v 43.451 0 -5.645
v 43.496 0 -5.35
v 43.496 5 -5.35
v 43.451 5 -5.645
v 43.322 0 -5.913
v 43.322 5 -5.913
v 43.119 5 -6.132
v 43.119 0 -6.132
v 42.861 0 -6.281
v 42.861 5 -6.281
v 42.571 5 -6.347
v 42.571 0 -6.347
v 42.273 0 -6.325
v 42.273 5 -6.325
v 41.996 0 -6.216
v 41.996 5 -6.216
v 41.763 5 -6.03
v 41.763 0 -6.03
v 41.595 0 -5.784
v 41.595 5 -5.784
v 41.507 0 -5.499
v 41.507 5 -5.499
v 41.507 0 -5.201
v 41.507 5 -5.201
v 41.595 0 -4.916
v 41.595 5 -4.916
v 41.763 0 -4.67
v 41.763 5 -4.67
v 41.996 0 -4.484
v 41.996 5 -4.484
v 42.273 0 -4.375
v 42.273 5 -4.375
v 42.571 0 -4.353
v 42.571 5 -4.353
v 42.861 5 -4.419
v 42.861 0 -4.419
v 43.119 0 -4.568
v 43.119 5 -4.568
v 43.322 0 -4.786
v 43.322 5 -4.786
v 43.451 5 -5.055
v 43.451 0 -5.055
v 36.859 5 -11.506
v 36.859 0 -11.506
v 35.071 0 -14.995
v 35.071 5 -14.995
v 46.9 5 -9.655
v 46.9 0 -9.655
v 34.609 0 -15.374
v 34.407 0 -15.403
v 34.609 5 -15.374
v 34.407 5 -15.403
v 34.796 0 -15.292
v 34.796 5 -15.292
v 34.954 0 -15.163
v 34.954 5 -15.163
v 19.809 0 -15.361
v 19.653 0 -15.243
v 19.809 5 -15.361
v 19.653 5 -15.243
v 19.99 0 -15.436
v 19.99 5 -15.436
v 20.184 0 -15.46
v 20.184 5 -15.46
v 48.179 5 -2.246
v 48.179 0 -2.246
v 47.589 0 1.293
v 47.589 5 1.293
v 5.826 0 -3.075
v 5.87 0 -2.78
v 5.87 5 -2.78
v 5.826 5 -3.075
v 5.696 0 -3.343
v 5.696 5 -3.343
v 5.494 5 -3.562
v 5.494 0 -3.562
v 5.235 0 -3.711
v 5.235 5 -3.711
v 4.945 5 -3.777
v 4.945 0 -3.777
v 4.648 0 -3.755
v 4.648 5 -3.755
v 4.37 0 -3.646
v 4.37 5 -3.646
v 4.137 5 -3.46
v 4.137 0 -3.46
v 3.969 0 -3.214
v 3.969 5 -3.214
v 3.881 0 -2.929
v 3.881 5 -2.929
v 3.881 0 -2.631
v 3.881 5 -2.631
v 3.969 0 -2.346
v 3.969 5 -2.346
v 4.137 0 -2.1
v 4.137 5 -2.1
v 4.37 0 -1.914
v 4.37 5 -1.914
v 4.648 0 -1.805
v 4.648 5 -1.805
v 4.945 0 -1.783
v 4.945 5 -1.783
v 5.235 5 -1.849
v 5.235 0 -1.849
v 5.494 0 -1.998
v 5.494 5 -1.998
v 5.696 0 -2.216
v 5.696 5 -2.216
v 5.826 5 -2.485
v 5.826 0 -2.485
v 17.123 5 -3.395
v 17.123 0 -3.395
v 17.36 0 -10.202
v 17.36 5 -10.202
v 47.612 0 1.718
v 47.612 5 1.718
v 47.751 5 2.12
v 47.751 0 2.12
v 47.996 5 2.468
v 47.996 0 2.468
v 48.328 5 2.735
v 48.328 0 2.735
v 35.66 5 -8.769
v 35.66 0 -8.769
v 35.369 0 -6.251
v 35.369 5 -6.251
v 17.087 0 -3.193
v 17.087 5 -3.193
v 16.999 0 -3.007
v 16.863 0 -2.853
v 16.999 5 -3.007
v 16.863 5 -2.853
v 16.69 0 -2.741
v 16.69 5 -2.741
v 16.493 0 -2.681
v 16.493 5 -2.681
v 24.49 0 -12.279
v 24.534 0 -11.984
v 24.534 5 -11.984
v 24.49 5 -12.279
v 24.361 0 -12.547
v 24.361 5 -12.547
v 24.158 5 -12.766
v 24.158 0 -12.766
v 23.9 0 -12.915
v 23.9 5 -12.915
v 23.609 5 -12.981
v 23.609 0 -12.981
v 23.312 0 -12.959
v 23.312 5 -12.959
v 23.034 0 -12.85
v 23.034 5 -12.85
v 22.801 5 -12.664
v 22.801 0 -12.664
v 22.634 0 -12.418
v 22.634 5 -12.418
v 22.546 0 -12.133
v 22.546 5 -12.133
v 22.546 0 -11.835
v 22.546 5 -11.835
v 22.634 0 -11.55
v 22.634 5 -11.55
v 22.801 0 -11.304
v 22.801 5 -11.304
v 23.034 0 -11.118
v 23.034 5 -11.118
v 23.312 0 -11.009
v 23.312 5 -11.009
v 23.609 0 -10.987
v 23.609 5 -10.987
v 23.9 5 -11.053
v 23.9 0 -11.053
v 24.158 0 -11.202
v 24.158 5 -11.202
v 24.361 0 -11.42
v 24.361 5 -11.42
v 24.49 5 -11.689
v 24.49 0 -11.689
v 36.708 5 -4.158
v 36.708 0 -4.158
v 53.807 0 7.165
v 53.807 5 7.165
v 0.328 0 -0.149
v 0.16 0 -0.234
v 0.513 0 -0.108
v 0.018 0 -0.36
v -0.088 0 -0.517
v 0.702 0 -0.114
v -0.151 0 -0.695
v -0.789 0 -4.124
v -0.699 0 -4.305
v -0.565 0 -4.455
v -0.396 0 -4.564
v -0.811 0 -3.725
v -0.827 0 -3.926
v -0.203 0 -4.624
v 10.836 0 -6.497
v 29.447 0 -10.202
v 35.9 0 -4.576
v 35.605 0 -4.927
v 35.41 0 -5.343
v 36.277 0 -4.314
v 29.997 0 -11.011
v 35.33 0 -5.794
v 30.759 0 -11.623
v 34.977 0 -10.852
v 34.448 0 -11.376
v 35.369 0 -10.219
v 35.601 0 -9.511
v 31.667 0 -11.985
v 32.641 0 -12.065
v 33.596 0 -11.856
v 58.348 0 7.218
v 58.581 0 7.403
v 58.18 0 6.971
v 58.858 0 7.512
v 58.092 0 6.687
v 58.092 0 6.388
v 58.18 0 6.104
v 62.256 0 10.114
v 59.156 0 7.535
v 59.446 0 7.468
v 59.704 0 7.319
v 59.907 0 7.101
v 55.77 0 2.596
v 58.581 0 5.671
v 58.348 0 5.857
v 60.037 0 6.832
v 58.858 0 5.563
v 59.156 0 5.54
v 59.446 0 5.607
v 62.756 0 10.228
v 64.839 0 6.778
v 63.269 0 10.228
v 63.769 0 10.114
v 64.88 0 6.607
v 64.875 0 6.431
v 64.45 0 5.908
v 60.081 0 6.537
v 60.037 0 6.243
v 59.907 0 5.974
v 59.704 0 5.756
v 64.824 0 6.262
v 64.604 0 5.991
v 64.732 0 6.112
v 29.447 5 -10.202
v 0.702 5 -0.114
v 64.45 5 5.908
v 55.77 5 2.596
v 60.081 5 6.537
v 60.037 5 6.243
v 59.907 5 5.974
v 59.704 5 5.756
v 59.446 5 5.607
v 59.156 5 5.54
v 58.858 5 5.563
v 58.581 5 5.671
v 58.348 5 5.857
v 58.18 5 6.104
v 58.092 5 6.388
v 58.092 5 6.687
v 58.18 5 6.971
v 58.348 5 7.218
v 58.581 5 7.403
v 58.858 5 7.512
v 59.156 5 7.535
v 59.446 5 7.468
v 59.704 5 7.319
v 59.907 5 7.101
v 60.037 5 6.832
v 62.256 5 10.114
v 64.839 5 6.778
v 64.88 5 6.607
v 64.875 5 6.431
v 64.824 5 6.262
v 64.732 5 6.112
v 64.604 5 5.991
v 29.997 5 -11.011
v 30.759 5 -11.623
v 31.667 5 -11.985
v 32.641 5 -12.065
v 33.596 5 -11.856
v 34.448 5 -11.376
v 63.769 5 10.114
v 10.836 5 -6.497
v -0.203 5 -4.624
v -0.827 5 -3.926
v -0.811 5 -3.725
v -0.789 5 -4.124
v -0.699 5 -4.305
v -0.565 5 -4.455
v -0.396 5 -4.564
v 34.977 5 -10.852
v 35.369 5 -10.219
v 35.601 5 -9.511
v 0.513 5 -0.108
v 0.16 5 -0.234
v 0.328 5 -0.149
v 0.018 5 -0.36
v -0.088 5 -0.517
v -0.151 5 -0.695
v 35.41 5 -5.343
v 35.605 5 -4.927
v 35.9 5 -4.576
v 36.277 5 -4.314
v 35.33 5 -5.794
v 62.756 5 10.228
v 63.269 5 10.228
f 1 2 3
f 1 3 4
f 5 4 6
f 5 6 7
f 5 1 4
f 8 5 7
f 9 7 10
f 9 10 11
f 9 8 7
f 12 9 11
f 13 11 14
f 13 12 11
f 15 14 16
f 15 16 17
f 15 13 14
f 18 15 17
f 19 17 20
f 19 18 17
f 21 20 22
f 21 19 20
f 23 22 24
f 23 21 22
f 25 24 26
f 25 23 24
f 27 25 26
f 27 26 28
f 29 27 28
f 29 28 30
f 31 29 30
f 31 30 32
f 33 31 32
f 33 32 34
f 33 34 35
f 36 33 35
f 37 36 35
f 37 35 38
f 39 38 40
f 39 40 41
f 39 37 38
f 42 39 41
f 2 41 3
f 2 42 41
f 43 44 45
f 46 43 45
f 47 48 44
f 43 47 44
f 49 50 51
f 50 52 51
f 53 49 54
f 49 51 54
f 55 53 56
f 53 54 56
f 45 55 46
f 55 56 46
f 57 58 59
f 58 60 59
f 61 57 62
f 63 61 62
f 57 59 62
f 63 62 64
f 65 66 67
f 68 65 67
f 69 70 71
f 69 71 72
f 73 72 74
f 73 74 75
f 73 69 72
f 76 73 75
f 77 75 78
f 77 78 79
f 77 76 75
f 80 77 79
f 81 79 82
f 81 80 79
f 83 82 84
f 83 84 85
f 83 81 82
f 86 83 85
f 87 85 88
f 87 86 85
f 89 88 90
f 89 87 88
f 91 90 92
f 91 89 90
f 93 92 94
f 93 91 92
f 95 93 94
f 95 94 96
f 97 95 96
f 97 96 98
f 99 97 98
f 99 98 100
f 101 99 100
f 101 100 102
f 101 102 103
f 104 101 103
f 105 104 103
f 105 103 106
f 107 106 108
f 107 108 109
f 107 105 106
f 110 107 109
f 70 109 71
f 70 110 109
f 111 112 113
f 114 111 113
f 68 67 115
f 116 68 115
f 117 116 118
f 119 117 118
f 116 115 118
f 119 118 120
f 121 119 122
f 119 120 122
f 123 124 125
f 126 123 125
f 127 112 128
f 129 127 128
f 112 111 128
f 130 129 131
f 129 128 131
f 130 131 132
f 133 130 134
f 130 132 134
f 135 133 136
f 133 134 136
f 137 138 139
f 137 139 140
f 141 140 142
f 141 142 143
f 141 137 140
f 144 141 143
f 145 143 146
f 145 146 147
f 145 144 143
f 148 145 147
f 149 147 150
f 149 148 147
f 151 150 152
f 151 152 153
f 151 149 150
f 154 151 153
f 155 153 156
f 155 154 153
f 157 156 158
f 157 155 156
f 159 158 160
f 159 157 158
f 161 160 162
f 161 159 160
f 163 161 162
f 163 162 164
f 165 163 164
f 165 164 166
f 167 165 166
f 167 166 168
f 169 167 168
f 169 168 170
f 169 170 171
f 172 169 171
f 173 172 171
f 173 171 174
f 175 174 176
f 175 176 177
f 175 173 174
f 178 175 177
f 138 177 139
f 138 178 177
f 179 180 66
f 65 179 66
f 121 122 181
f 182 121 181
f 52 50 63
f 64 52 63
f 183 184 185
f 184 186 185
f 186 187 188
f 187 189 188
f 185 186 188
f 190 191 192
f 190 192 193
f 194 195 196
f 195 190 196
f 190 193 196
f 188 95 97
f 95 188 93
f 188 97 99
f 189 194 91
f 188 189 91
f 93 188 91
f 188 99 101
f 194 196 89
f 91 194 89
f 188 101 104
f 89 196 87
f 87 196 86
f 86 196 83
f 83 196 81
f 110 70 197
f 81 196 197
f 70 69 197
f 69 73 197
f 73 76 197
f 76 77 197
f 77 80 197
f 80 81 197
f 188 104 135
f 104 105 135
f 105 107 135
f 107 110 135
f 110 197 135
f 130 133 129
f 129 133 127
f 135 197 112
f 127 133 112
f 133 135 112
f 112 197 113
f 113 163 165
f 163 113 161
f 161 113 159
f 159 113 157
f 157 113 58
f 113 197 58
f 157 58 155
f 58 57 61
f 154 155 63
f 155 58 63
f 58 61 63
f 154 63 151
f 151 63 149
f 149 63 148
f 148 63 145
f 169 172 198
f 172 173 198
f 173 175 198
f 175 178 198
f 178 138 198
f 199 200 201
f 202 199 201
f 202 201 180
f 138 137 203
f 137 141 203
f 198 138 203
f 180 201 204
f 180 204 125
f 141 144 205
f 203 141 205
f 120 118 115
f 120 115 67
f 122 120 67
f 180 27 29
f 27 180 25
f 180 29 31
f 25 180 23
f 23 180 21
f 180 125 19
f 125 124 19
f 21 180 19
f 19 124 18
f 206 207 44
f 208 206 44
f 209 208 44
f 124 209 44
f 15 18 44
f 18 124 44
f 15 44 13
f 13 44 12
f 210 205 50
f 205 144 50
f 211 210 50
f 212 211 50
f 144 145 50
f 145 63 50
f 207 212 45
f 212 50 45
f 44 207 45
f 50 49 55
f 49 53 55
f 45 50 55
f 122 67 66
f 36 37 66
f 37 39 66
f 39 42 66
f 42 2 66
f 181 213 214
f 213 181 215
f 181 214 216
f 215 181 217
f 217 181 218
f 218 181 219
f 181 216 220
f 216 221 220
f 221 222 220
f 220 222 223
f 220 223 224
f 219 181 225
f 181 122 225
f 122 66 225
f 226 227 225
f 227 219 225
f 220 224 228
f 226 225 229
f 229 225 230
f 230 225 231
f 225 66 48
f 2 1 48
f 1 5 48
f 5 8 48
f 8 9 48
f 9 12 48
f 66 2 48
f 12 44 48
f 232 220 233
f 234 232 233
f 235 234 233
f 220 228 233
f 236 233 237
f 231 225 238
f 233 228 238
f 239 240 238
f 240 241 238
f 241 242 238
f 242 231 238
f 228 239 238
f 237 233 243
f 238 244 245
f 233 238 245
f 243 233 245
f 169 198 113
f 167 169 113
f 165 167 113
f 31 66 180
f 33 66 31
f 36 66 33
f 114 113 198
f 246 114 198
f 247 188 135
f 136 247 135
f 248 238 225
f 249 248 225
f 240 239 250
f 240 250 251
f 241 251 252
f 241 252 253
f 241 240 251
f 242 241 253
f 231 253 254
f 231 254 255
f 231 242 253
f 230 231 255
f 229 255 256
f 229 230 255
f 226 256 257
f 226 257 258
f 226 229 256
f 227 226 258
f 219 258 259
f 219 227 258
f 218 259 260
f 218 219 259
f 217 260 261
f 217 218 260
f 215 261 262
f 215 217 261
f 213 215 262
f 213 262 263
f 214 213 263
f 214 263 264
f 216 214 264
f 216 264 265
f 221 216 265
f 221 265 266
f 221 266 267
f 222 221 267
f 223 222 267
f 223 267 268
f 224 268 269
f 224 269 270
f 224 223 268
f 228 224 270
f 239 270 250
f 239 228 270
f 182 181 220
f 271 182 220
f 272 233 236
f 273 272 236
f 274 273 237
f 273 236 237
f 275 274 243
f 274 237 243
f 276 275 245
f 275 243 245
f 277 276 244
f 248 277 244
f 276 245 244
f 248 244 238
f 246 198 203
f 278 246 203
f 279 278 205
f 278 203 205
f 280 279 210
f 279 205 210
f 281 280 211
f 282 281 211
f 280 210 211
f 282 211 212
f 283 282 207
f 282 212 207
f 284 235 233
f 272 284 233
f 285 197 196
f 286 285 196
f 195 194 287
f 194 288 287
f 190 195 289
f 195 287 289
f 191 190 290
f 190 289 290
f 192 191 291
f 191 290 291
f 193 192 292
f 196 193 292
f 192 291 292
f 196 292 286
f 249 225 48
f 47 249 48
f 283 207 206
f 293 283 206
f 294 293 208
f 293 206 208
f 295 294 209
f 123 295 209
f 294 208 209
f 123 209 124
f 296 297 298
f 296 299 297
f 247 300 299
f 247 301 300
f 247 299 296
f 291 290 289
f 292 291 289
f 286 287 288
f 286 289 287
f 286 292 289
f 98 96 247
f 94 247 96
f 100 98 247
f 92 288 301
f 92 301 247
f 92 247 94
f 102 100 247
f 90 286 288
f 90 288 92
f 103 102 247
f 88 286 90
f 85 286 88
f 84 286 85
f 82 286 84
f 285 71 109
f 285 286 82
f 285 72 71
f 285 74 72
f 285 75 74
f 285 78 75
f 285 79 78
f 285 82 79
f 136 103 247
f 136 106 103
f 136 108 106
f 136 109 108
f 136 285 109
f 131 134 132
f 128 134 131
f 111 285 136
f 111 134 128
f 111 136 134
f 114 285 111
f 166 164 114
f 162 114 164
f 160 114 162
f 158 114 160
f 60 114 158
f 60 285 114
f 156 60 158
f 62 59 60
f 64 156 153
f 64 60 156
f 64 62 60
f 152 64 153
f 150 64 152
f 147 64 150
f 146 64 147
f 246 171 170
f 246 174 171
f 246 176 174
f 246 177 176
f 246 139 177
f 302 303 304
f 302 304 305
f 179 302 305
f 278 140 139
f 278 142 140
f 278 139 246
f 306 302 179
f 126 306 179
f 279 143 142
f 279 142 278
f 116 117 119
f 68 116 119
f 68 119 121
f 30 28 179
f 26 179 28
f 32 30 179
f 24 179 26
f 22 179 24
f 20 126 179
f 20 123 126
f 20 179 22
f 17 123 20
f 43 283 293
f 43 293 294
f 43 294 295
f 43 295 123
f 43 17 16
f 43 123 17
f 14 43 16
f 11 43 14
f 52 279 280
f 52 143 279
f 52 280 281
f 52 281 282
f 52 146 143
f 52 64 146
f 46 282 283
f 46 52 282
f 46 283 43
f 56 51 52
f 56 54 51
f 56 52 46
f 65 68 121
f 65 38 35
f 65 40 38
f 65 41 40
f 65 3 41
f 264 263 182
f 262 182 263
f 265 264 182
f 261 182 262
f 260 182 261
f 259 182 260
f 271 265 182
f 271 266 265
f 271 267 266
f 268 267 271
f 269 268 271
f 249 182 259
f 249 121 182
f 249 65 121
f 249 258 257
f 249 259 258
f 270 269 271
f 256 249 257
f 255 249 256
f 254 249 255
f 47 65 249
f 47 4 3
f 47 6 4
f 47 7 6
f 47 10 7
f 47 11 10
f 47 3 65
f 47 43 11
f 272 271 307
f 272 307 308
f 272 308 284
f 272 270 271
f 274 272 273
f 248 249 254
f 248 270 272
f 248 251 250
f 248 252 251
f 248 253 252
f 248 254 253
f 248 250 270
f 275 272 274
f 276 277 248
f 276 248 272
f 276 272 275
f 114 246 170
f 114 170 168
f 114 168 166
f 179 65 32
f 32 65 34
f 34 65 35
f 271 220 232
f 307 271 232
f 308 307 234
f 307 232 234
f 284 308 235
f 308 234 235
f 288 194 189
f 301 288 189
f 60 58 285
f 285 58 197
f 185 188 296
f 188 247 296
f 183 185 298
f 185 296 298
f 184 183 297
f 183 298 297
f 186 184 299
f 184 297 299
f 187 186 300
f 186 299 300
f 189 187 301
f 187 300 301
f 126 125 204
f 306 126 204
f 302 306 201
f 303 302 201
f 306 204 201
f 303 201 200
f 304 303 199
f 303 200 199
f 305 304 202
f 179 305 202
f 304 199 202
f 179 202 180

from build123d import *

# Parameters (mm, degrees)
SKETCH1_R           = 1
BOSS_EXTRUDE1_DEPTH = 5
FILLET1_R           = 0.75


with BuildPart() as part:
    # Sketch1 → Boss-Extrude1 (new body)
    with BuildSketch(Plane(origin=(0, 0, 0), x_dir=(1, 0, 0), z_dir=(0, 1, 0))):
        with BuildLine():
            Line((17.35965567, 10.202030332), (29.447075717, 10.202030332))
            ThreePointArc((29.447075717, 10.202030332), (31.66677099, 11.984583247), (34.447841937, 11.376153807))
            ThreePointArc((34.447841937, 11.376153807), (35.368803472, 10.219084334), (35.659625363, 8.769117942))
            Line((35.659625363, 8.769117942), (35.368803472, 6.25123518))
            ThreePointArc((35.368803472, 6.25123518), (35.604797827, 4.927222302), (36.70788952, 4.157877025))
            Line((36.70788952, 4.157877025), (48.178757035, 2.245683648))
            Line((48.178757035, 2.245683648), (47.58886704, -1.292949037))
            ThreePointArc((47.58886704, -1.292949037), (47.751350099, -2.119984122), (48.327597047, -2.73506723))
            Line((48.327597047, -2.73506723), (53.807205044, -7.165448567))
            Line((53.807205044, -7.165448567), (62.256251854, -10.114363821))
            ThreePointArc((62.256251854, -10.114363821), (63.012595107, -10.242357854), (63.768803253, -10.11356799))
            Line((63.768803253, -10.11356799), (64.838933553, -6.777694818))
            ThreePointArc((64.838933553, -6.777694818), (64.82438131, -6.262093226), (64.449505937, -5.907797834))
            Line((64.449505937, -5.907797834), (55.769751742, -2.596216357))
            Line((55.769751742, -2.596216357), (46.89988124, 9.654677352))
            Line((46.89988124, 9.654677352), (36.858577183, 11.505687421))
            Line((36.858577183, 11.505687421), (34.863073504, 15.401227244))
            Line((34.863073504, 15.401227244), (19.873257266, 15.461670051))
            Line((19.873257266, 15.461670051), (10.836196027, 6.49719565))
            Line((10.836196027, 6.49719565), (-0.977680405, 4.492963372))
            Line((-0.977680405, 4.492963372), (0, 0))
            Line((0, 0), (17.101259036, 2.779786934))
            Line((17.101259036, 2.779786934), (17.35965567, 10.202030332))
        make_face()
        with Locations((59.08099239, -6.537460134)):
            Circle(SKETCH1_R, mode=Mode.SUBTRACT)
        with Locations((23.534477486, 11.983797813)):
            Circle(SKETCH1_R, mode=Mode.SUBTRACT)
        with Locations((4.870081777, 2.779786934)):
            Circle(SKETCH1_R, mode=Mode.SUBTRACT)
        with Locations((42.49591928, 5.349768569)):
            Circle(SKETCH1_R, mode=Mode.SUBTRACT)
    extrude(amount=BOSS_EXTRUDE1_DEPTH)

    # Fillet1
    fillet1_edges = [part.edges().sort_by_distance(p)[0] for p in [
        (17.101259036, 2.5, -2.779786934),
        (0, 2.5, 0),
        (-0.977680405, 2.5, -4.492963372),
        (19.873257266, 2.5, -15.461670051),
        (34.863073504, 2.5, -15.401227244),
    ]]
    fillet(fillet1_edges, radius=FILLET1_R)


solid = part.part
